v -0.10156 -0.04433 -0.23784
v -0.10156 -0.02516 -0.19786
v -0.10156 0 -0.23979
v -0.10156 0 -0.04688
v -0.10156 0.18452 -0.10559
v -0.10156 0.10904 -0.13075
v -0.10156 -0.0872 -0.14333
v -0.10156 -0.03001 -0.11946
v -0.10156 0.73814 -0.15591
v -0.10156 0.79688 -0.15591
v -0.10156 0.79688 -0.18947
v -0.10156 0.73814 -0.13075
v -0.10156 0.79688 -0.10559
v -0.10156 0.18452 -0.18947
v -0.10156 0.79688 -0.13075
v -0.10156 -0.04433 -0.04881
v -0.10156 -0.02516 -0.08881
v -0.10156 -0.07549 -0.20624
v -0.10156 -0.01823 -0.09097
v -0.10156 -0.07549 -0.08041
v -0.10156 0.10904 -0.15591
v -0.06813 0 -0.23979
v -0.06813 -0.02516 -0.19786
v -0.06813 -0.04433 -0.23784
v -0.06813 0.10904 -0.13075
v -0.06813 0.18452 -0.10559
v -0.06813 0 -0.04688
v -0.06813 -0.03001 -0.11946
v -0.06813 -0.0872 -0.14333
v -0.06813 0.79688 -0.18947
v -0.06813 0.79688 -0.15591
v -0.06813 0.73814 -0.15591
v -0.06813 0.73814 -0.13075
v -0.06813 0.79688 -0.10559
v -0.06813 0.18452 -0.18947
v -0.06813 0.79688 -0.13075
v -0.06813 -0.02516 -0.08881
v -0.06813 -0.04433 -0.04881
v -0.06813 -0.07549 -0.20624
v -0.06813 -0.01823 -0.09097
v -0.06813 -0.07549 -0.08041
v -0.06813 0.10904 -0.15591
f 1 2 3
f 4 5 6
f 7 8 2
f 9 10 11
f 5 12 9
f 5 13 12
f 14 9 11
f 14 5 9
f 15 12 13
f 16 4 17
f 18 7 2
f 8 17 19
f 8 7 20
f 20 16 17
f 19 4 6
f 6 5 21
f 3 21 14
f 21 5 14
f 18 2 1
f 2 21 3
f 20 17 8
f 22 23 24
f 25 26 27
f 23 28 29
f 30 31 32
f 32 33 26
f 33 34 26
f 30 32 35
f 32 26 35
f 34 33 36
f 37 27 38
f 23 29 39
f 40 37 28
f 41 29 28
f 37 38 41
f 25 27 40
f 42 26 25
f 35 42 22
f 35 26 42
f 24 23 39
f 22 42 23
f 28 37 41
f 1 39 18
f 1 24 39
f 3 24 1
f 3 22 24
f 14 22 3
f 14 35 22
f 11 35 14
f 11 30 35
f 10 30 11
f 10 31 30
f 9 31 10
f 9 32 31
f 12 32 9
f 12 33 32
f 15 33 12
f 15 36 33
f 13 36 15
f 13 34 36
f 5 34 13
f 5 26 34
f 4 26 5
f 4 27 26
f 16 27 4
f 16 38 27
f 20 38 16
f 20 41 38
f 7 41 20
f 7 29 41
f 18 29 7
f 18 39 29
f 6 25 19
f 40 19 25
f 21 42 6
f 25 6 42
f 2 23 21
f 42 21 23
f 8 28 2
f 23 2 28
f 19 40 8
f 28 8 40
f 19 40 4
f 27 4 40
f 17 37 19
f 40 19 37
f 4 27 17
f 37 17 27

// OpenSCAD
EPS = 0.01;

module loop0() {
    polygon(points=[
        [0.0, 0.0],
        [0.0019490941863378162, -0.04433658679437616],
        [0.03355263157894737, -0.07549342105263158],
        [0.09646381578947369, -0.08720656501962193],
        [0.159375, -0.07549342105263158],
        [0.19097853739260956, -0.044336586794376284],
        [0.19292763157894738, 0.0],
        [0.14259868421052632, 0.18453947368421053],
        [0.14259868421052632, 0.796875],
        [0.10904605263157895, 0.796875],
        [0.10904605263157895, 0.7381578947368421],
        [0.08388157894736842, 0.7381578947368421],
        [0.08388157894736842, 0.796875],
        [0.0587171052631579, 0.796875],
        [0.0587171052631579, 0.18453947368421053],
        [0.0, 0.0]
    ]);
}

module loop1() {
    polygon(points=[
        [0.0, 0.0],
        [0.0725867756556451, -0.03002210922402418],
        [0.15098684210526317, -0.025164473684210528],
        [0.10904605263157895, 0.10904605263157895],
        [0.08388157894736842, 0.10904605263157895],
        [0.04194078947368421, -0.025164473684210528],
        [0.0, 0.0]
    ]);
}

translate([-0.1015625, 0.0, -0.046875])
rotate([0, 90, 0])
linear_extrude(height=0.0234375 + EPS)
difference() {
    loop0();
    translate([0, 0, EPS])
    loop1();
}
